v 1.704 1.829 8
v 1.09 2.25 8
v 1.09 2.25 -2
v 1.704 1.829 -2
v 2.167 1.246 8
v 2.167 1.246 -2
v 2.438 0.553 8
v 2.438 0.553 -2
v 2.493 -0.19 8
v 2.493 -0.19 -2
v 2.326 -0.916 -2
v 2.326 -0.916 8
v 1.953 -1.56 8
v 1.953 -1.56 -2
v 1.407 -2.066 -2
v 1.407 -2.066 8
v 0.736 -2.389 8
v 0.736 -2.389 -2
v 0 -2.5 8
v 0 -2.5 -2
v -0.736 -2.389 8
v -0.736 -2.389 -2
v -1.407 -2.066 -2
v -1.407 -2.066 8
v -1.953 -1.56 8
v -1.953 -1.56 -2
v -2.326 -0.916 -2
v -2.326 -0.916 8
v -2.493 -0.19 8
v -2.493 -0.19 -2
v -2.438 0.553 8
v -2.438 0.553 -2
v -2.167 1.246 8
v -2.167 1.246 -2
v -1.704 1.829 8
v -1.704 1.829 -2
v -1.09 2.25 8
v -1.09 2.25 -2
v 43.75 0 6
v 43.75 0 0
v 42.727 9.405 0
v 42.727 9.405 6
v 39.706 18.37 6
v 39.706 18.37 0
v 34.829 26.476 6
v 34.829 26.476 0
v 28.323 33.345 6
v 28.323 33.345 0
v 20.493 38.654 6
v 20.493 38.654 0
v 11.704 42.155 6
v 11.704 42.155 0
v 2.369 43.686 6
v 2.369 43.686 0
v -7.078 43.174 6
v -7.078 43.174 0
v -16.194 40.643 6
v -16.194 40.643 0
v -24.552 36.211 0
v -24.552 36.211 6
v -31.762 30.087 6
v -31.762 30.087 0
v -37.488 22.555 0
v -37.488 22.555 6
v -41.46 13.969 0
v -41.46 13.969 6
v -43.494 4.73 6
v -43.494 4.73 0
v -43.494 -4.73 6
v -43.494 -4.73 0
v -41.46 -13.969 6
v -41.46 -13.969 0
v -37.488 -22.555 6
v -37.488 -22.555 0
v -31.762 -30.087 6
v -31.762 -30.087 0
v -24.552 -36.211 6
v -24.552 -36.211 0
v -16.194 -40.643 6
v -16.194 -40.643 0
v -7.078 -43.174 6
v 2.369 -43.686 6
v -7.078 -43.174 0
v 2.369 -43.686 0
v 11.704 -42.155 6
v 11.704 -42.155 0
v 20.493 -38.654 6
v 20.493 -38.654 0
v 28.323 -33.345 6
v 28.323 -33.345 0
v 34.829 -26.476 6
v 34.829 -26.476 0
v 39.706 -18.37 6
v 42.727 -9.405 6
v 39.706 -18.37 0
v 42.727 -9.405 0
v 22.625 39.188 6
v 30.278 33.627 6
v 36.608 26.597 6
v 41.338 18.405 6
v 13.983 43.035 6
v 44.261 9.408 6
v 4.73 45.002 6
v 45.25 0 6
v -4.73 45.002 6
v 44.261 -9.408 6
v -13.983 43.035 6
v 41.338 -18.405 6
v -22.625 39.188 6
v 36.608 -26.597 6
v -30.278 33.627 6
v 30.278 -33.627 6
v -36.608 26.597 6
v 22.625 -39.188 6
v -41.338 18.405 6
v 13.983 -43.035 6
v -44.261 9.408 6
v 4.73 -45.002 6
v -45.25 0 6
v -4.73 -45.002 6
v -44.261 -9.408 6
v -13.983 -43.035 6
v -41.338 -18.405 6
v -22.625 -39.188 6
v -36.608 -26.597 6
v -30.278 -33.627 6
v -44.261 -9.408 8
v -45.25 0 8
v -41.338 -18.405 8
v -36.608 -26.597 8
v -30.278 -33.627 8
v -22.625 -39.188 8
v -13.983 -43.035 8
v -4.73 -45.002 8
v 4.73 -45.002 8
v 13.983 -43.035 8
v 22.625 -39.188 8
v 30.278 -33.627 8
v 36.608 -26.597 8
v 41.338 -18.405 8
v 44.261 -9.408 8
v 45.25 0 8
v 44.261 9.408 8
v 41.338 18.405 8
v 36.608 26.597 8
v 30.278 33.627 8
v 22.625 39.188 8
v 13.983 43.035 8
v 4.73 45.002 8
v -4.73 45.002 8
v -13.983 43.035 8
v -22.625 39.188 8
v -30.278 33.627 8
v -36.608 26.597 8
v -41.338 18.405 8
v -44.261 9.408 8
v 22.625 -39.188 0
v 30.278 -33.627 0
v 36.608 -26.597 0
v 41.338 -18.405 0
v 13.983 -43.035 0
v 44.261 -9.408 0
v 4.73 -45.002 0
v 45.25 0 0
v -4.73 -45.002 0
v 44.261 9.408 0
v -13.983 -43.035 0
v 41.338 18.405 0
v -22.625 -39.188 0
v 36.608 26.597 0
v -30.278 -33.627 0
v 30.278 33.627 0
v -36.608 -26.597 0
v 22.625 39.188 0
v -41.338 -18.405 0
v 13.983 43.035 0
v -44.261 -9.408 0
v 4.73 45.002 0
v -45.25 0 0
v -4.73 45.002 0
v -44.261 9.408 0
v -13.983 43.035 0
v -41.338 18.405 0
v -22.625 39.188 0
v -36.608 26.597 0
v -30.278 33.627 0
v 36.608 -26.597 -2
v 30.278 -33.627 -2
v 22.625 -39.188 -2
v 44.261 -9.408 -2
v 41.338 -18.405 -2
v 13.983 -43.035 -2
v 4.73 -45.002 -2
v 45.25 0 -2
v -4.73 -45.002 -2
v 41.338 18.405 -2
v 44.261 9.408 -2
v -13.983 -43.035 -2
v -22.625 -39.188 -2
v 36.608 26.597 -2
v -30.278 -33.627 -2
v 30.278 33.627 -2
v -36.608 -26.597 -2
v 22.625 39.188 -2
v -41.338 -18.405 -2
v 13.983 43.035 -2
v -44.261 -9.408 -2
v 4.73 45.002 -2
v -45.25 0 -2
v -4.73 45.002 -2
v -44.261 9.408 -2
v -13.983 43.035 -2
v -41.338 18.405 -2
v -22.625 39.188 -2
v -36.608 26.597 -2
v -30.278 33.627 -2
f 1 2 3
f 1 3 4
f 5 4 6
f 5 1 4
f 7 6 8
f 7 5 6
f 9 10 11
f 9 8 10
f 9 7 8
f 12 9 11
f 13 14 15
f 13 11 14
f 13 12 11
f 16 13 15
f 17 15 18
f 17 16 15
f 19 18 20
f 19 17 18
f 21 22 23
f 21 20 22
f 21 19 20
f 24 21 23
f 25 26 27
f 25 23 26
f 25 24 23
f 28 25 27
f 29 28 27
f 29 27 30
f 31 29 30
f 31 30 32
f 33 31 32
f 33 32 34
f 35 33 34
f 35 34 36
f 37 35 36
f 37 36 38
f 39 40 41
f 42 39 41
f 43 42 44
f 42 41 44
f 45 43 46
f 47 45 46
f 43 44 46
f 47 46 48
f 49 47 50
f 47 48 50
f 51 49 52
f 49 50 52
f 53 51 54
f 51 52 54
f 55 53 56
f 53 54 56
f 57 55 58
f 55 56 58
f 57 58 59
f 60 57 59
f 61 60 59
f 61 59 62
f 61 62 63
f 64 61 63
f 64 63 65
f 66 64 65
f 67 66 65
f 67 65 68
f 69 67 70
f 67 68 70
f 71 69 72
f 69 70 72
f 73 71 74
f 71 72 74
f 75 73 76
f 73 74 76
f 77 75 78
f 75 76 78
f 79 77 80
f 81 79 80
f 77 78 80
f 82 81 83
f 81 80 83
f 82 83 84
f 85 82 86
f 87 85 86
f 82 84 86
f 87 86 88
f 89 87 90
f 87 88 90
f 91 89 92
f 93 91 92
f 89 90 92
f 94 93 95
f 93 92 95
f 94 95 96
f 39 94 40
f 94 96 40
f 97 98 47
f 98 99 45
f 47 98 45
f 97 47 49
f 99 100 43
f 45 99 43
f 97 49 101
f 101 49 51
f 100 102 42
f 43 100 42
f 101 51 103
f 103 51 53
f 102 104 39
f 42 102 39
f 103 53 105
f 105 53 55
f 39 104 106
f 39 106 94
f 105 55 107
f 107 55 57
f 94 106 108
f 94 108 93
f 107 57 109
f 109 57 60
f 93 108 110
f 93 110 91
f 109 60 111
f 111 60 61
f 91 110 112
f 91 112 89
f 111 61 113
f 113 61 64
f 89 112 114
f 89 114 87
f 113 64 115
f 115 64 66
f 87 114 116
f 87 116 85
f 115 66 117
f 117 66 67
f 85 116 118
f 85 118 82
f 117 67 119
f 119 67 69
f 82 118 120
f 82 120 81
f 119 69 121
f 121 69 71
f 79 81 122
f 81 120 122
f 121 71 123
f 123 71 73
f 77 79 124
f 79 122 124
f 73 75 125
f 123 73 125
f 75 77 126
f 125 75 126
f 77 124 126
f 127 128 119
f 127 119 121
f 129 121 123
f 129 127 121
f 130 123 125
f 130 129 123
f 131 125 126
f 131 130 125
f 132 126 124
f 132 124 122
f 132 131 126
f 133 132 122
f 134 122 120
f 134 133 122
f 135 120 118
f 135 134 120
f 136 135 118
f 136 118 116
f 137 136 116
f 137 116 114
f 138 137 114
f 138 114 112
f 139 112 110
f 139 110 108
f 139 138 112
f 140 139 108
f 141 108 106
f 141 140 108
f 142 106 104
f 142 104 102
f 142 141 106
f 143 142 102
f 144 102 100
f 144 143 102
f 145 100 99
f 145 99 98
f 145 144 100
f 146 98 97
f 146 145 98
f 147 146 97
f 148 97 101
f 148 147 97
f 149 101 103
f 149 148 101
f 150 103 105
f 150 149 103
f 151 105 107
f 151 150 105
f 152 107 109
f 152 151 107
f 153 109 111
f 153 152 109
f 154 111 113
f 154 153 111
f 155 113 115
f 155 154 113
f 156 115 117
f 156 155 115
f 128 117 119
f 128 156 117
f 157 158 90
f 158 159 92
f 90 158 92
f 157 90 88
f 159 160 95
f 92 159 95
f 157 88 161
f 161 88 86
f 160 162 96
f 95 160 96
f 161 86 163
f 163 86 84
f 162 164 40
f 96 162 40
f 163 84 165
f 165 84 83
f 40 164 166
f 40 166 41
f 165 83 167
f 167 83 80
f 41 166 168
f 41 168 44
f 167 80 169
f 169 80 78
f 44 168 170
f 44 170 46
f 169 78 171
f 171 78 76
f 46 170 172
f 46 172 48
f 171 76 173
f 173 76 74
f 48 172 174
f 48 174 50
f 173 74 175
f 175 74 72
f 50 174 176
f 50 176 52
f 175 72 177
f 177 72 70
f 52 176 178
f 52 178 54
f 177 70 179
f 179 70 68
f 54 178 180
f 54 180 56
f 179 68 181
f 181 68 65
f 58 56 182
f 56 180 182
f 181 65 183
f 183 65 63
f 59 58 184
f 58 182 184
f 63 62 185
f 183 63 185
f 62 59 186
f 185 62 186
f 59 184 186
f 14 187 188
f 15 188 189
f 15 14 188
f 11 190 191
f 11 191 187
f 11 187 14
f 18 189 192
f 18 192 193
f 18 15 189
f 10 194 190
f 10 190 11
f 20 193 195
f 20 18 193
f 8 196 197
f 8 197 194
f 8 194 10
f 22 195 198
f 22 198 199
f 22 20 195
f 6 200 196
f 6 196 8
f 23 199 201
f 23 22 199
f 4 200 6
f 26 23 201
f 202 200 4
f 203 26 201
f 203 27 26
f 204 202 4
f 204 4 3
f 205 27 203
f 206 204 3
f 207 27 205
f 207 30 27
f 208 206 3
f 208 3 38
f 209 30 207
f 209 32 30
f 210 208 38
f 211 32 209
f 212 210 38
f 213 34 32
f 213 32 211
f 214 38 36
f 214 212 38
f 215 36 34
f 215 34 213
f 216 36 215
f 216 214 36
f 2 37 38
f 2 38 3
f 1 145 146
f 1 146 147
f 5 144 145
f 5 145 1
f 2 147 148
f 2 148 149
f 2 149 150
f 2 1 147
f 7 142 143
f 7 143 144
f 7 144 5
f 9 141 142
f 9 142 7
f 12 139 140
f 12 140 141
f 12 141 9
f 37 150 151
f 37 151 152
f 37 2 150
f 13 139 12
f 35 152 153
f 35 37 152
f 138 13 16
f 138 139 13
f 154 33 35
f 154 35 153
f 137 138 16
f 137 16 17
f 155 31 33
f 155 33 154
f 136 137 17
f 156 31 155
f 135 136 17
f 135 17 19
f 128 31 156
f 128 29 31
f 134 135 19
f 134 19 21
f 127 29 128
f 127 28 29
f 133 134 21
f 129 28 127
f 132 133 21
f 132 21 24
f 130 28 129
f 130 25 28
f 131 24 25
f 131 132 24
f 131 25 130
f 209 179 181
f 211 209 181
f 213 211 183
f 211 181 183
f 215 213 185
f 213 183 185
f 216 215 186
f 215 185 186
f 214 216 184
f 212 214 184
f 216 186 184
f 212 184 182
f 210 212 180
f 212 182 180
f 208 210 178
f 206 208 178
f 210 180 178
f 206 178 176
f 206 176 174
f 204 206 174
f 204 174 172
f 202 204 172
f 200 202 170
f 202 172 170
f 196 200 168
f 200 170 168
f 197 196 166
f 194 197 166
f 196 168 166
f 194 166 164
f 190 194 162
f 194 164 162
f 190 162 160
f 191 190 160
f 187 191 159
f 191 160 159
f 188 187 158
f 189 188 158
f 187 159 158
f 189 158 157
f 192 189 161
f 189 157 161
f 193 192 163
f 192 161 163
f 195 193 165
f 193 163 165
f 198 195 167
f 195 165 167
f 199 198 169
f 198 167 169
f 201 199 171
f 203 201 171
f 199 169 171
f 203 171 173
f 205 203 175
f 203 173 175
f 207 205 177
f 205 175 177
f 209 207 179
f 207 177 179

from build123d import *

# Parameters (mm, degrees)
SKIZZE2_R         = 43.75
ZAHNFL_CHE_DEPTH  = 6
SKIZZE4_R         = 45.25
SEITENTEIL1_DEPTH = 2
SEITENTEIL2_START = 2
SKIZZE5_R         = 45.25
SEITENTEIL2_DEPTH = 2
AUSSPARUNG_DEPTH  = 65.769784622


with BuildPart() as part:
    # Skizze2 → Zahnfläche (new body)
    with BuildSketch(Plane.XY):
        Circle(SKIZZE2_R)
    extrude(amount=ZAHNFL_CHE_DEPTH)

    # Skizze4 → Seitenteil1 (add)
    with BuildSketch(Plane(origin=(0, 0, 0), x_dir=(-1, 0, 0), z_dir=(0, 0, -1))):
        Circle(SKIZZE4_R)
    extrude(amount=SEITENTEIL1_DEPTH)

    # Skizze5 → Seitenteil2 (add)
    with BuildSketch(Plane.XY.offset(6).offset(SEITENTEIL2_START)):
        with Locations(Location((0, 0, 0), (0, 0, 180))):
            Circle(SKIZZE5_R)
    extrude(amount=-SEITENTEIL2_DEPTH)

    # Skizze6 → Aussparung (cut, through all)
    with BuildSketch(Plane.XY.offset(8)):
        with BuildLine():
            Line((-1.089724736, 2.25), (1.089724736, 2.25))
            ThreePointArc((1.089724736, 2.25), (0, -2.5), (-1.089724736, 2.25))
        make_face()
    extrude(amount=-AUSSPARUNG_DEPTH, mode=Mode.SUBTRACT)


solid = part.part
